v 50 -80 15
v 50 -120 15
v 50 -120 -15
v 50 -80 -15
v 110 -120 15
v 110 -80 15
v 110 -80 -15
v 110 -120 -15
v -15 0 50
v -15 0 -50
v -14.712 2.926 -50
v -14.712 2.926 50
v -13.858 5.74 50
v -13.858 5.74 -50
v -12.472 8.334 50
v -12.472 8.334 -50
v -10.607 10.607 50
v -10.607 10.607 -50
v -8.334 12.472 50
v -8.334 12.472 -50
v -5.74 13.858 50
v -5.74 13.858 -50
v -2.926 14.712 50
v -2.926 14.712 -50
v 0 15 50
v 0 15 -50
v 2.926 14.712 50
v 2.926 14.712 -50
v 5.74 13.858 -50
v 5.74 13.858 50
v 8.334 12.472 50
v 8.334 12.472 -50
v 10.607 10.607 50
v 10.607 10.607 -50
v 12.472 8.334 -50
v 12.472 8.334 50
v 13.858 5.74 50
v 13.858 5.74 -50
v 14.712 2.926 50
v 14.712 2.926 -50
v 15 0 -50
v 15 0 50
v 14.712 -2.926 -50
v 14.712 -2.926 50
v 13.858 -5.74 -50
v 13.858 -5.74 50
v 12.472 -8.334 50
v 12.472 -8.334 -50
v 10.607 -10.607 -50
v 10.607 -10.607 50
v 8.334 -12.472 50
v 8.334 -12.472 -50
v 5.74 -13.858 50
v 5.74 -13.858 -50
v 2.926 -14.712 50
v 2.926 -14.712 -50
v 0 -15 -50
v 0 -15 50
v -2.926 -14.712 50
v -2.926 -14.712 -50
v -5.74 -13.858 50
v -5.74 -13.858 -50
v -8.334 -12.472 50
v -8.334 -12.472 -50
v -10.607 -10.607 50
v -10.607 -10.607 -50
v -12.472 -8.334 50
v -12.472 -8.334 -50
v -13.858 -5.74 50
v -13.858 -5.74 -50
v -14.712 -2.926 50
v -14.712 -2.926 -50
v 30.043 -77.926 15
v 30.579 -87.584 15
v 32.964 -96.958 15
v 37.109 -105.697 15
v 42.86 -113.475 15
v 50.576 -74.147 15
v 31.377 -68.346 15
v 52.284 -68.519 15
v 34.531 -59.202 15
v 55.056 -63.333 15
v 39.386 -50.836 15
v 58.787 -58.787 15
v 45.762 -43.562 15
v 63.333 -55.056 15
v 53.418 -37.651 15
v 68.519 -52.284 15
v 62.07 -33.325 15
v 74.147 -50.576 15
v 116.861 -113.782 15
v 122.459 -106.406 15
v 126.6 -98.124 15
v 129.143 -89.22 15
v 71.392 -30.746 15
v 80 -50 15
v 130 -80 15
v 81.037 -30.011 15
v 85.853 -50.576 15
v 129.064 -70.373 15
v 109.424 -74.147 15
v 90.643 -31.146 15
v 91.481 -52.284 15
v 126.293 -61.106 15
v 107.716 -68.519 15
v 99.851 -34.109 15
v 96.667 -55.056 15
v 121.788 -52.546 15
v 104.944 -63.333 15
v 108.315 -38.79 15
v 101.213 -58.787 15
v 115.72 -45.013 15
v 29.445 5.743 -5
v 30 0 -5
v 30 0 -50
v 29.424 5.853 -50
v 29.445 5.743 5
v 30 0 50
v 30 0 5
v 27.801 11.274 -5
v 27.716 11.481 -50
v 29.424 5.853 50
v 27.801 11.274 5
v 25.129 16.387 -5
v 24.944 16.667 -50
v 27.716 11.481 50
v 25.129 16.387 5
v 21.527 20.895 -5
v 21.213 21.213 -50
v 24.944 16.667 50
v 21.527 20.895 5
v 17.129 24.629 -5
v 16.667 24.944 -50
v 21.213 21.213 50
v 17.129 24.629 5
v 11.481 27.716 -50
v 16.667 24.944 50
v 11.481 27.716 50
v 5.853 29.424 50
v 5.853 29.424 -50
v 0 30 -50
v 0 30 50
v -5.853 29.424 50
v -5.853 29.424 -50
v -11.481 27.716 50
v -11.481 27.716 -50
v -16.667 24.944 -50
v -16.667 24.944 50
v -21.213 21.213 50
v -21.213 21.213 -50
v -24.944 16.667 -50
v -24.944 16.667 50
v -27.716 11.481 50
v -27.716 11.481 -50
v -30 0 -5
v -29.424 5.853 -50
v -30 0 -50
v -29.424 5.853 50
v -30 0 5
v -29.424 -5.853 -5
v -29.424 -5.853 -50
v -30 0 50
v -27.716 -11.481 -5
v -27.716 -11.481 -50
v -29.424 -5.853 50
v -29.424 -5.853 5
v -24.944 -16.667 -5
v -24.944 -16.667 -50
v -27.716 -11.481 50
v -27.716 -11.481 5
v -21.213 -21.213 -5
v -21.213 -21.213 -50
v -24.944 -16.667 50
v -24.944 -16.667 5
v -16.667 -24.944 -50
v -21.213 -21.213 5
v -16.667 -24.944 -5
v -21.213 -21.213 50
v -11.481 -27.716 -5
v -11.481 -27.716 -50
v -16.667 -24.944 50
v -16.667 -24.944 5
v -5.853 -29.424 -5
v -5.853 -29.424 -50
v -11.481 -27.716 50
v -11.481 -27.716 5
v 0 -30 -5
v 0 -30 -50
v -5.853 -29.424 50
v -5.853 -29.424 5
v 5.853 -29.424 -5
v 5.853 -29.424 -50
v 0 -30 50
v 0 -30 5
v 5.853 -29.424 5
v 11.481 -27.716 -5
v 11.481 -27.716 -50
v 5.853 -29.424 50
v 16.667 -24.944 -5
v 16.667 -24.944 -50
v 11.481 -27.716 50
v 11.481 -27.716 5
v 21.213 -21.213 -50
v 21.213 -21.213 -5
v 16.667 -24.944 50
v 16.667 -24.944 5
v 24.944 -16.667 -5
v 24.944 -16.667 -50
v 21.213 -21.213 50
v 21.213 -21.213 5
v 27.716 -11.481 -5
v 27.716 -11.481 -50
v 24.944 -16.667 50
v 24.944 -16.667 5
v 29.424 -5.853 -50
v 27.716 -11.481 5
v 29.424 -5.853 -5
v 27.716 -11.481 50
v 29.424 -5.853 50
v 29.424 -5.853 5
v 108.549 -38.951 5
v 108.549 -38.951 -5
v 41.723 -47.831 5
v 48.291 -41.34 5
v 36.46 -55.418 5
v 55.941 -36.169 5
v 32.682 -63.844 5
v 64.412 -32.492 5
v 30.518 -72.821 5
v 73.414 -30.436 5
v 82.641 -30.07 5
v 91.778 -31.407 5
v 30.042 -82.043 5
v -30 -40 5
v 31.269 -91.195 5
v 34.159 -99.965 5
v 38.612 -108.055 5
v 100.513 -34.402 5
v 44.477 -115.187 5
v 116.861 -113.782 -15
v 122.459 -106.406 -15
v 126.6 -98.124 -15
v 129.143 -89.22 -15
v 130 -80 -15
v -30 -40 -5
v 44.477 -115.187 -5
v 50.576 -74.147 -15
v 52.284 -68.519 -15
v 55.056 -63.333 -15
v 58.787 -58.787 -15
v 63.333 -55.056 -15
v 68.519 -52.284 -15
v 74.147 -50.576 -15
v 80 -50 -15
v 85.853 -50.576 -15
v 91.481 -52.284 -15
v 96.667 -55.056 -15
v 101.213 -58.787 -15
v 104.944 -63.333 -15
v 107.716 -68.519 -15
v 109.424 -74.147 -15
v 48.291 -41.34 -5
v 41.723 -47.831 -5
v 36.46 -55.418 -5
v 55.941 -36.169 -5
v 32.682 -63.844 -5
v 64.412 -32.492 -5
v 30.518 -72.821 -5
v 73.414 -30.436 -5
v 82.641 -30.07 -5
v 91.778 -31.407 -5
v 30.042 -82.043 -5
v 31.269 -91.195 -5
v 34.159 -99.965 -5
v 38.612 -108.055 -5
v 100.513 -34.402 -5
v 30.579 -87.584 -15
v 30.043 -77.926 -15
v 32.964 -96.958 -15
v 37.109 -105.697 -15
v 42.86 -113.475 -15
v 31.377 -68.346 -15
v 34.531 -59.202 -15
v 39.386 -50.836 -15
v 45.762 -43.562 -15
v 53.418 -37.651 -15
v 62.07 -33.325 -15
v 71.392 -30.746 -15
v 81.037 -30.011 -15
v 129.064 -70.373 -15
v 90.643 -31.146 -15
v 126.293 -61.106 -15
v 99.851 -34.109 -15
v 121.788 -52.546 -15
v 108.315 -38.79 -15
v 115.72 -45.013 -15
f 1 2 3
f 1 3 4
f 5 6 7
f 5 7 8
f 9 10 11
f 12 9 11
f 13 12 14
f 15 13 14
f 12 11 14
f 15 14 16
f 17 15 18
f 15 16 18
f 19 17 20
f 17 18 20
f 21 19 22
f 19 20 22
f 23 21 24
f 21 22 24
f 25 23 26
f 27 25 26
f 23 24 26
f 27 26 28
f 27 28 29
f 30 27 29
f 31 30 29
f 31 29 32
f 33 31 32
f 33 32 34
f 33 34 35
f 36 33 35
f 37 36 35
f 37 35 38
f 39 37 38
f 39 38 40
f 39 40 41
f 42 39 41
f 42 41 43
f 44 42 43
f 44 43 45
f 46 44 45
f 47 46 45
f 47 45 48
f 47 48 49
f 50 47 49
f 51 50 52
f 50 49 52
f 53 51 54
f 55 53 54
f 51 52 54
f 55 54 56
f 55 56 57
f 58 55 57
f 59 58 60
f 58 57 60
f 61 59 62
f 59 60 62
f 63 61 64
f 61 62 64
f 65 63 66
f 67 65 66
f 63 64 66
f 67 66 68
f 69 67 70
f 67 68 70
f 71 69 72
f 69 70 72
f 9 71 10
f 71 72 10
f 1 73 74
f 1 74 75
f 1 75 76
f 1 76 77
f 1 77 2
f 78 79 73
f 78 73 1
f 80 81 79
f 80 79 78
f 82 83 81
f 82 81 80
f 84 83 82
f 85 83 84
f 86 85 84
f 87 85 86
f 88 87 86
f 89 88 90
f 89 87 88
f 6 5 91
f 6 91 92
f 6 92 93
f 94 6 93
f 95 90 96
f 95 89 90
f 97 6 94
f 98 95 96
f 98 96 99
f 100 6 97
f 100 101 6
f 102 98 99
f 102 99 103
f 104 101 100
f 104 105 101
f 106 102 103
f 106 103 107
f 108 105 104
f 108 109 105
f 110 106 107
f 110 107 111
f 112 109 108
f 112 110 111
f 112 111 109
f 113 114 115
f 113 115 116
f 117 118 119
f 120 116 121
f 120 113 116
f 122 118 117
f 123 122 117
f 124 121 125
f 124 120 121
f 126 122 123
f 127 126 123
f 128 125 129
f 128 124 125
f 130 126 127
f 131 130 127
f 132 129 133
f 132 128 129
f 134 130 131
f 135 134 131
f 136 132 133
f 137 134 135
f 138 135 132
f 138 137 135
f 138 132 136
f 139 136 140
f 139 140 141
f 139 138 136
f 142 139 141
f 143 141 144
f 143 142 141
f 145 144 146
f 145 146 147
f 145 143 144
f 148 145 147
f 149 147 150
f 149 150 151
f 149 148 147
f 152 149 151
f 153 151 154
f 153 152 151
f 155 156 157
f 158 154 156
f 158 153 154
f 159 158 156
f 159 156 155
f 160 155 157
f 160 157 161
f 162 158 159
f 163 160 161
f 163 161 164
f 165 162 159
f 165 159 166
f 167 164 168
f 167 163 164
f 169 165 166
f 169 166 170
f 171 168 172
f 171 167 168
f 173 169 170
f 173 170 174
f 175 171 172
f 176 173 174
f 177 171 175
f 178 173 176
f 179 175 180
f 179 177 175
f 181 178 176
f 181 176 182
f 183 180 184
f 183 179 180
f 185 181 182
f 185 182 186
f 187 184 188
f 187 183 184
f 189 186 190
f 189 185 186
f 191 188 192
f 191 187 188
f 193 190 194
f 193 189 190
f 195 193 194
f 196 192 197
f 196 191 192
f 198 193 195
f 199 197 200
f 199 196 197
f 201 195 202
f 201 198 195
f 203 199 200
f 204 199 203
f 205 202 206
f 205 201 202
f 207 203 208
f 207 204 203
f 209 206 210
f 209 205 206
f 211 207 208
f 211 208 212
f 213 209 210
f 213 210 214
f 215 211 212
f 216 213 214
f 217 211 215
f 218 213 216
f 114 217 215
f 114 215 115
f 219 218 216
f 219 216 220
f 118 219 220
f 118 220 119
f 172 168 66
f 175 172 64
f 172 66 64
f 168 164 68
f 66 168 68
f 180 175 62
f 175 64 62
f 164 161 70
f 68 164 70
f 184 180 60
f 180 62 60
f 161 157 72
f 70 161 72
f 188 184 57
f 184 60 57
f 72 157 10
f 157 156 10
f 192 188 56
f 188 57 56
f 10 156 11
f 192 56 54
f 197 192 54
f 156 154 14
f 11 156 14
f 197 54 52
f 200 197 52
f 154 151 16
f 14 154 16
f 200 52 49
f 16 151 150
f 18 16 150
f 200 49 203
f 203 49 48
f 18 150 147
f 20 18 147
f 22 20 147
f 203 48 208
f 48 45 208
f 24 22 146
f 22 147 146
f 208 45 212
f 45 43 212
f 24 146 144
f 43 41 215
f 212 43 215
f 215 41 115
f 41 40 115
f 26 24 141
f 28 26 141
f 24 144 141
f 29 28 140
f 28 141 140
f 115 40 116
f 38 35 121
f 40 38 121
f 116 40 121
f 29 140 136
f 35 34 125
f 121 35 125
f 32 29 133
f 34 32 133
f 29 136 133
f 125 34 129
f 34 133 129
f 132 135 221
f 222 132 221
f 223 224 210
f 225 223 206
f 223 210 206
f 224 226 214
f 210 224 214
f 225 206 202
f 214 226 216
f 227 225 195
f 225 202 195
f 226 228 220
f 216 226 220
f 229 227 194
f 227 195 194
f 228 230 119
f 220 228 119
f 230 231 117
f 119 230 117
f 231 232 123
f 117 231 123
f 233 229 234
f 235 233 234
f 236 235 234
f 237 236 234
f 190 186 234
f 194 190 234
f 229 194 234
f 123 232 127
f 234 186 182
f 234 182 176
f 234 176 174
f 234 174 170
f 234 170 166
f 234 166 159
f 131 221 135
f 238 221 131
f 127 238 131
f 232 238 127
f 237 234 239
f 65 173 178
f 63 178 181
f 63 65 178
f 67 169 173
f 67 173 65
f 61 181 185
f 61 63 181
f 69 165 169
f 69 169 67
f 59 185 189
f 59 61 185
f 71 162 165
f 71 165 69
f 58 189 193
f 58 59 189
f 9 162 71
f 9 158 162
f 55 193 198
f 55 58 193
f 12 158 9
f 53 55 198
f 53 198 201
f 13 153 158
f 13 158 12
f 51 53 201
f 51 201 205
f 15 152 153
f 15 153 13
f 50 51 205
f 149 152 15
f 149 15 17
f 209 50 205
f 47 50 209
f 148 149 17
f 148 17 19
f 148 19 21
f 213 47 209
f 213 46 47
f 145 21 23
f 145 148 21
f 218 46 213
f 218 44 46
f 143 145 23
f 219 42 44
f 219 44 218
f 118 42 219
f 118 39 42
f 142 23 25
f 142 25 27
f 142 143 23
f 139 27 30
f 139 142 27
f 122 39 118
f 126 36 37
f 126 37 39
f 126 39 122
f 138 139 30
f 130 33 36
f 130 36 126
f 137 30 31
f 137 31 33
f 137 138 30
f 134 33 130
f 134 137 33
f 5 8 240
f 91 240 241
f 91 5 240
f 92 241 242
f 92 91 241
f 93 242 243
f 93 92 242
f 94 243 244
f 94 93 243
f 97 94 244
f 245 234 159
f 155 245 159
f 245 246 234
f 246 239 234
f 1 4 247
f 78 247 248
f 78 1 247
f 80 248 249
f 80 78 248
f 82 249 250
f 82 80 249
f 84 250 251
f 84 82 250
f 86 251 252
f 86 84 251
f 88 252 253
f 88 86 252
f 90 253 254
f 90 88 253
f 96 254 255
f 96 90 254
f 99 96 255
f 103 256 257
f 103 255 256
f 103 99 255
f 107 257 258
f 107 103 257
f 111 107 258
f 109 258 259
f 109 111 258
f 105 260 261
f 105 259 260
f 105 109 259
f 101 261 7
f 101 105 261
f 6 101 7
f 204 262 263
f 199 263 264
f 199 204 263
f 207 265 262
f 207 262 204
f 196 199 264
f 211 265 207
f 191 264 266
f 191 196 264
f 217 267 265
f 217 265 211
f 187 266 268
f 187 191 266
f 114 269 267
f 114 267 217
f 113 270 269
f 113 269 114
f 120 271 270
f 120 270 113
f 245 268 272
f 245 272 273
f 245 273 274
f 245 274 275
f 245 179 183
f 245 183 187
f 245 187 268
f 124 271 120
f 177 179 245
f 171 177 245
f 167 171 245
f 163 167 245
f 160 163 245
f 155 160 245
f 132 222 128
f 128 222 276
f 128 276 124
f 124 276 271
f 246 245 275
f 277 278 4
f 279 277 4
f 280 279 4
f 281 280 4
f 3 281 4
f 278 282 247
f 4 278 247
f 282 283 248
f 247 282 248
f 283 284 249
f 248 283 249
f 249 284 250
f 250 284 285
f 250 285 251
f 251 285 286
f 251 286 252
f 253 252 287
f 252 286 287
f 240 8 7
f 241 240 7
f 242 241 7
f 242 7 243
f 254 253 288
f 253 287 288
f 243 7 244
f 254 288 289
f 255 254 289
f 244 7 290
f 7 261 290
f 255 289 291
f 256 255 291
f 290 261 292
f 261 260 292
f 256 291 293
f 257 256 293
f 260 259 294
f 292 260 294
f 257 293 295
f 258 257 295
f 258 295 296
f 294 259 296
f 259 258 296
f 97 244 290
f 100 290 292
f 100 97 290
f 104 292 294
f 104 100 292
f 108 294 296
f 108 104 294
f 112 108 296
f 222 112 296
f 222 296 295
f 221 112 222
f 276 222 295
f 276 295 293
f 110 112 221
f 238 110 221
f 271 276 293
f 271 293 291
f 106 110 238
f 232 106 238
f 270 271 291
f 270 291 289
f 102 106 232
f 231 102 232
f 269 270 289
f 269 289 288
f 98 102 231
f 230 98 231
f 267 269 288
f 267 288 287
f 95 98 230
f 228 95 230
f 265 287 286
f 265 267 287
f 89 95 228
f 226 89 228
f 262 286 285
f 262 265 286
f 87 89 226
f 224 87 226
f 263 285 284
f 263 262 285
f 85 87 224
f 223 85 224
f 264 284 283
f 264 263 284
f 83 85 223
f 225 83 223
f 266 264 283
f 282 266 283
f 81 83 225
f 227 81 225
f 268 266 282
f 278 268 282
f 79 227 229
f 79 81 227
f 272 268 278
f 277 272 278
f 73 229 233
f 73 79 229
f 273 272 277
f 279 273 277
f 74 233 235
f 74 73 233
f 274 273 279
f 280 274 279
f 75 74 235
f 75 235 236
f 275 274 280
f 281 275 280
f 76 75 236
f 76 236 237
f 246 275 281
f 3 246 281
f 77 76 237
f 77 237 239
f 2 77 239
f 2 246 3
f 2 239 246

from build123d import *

# Parameters (mm, degrees)
SKETCH1_R             = 30
BOSS_EXTRUDE1_DEPTH   = 50
SKETCH2_R             = 50
BOSS_EXTRUDE2_DEPTH   = 15
BOSS_EXTRUDE3_DEPTH   = 5
CUT_EXTRUDE1_DEPTH    = 196
F_1_0MM_DOWEL_HOLE1_D = 30


with BuildPart() as part:
    # Sketch1 → Boss-Extrude1 (new, symmetric)
    with BuildSketch(Plane.XY):
        Circle(SKETCH1_R)
    extrude(amount=BOSS_EXTRUDE1_DEPTH, both=True)



with BuildPart() as body_2:
    # Sketch2 → Boss-Extrude2 (new, symmetric)
    with BuildSketch(Plane.XY):
        with Locations((80, -80)):
            Circle(SKETCH2_R)
    extrude(amount=BOSS_EXTRUDE2_DEPTH, both=True)


with BuildPart() as part_1:
    add(part.part)

    add(body_2.part)  # Boss-Extrude3 merges body 2
    # Sketch3 → Boss-Extrude3 (add, symmetric)
    with BuildSketch(Plane.XY):
        Polygon((17.129116361, 24.629116361), (108.548527268, -38.951472732), (44.477364607, -115.187247331), (-30, -40), (-30, 0), align=None)
    extrude(amount=BOSS_EXTRUDE3_DEPTH, both=True)

    # Sketch4 → Cut-Extrude1 (cut, through all)
    with BuildSketch(Plane.XY.offset(15)):
        with BuildLine():
            Line((110, -80), (110, -155.272597881))
            ThreePointArc((110, -155.272597881), (80, -185.272597881), (50, -155.272597881))
            Line((50, -155.272597881), (50, -80))
            ThreePointArc((50, -80), (80, -50), (110, -80))
        make_face()
    extrude(amount=-CUT_EXTRUDE1_DEPTH, mode=Mode.SUBTRACT)

    # Ø1.0mm Dowel Hole1 (through all)
    with Locations(Plane.XY.offset(50)):
        with Locations((0, 0)):
            Hole(F_1_0MM_DOWEL_HOLE1_D / 2)


solid = part_1.part
